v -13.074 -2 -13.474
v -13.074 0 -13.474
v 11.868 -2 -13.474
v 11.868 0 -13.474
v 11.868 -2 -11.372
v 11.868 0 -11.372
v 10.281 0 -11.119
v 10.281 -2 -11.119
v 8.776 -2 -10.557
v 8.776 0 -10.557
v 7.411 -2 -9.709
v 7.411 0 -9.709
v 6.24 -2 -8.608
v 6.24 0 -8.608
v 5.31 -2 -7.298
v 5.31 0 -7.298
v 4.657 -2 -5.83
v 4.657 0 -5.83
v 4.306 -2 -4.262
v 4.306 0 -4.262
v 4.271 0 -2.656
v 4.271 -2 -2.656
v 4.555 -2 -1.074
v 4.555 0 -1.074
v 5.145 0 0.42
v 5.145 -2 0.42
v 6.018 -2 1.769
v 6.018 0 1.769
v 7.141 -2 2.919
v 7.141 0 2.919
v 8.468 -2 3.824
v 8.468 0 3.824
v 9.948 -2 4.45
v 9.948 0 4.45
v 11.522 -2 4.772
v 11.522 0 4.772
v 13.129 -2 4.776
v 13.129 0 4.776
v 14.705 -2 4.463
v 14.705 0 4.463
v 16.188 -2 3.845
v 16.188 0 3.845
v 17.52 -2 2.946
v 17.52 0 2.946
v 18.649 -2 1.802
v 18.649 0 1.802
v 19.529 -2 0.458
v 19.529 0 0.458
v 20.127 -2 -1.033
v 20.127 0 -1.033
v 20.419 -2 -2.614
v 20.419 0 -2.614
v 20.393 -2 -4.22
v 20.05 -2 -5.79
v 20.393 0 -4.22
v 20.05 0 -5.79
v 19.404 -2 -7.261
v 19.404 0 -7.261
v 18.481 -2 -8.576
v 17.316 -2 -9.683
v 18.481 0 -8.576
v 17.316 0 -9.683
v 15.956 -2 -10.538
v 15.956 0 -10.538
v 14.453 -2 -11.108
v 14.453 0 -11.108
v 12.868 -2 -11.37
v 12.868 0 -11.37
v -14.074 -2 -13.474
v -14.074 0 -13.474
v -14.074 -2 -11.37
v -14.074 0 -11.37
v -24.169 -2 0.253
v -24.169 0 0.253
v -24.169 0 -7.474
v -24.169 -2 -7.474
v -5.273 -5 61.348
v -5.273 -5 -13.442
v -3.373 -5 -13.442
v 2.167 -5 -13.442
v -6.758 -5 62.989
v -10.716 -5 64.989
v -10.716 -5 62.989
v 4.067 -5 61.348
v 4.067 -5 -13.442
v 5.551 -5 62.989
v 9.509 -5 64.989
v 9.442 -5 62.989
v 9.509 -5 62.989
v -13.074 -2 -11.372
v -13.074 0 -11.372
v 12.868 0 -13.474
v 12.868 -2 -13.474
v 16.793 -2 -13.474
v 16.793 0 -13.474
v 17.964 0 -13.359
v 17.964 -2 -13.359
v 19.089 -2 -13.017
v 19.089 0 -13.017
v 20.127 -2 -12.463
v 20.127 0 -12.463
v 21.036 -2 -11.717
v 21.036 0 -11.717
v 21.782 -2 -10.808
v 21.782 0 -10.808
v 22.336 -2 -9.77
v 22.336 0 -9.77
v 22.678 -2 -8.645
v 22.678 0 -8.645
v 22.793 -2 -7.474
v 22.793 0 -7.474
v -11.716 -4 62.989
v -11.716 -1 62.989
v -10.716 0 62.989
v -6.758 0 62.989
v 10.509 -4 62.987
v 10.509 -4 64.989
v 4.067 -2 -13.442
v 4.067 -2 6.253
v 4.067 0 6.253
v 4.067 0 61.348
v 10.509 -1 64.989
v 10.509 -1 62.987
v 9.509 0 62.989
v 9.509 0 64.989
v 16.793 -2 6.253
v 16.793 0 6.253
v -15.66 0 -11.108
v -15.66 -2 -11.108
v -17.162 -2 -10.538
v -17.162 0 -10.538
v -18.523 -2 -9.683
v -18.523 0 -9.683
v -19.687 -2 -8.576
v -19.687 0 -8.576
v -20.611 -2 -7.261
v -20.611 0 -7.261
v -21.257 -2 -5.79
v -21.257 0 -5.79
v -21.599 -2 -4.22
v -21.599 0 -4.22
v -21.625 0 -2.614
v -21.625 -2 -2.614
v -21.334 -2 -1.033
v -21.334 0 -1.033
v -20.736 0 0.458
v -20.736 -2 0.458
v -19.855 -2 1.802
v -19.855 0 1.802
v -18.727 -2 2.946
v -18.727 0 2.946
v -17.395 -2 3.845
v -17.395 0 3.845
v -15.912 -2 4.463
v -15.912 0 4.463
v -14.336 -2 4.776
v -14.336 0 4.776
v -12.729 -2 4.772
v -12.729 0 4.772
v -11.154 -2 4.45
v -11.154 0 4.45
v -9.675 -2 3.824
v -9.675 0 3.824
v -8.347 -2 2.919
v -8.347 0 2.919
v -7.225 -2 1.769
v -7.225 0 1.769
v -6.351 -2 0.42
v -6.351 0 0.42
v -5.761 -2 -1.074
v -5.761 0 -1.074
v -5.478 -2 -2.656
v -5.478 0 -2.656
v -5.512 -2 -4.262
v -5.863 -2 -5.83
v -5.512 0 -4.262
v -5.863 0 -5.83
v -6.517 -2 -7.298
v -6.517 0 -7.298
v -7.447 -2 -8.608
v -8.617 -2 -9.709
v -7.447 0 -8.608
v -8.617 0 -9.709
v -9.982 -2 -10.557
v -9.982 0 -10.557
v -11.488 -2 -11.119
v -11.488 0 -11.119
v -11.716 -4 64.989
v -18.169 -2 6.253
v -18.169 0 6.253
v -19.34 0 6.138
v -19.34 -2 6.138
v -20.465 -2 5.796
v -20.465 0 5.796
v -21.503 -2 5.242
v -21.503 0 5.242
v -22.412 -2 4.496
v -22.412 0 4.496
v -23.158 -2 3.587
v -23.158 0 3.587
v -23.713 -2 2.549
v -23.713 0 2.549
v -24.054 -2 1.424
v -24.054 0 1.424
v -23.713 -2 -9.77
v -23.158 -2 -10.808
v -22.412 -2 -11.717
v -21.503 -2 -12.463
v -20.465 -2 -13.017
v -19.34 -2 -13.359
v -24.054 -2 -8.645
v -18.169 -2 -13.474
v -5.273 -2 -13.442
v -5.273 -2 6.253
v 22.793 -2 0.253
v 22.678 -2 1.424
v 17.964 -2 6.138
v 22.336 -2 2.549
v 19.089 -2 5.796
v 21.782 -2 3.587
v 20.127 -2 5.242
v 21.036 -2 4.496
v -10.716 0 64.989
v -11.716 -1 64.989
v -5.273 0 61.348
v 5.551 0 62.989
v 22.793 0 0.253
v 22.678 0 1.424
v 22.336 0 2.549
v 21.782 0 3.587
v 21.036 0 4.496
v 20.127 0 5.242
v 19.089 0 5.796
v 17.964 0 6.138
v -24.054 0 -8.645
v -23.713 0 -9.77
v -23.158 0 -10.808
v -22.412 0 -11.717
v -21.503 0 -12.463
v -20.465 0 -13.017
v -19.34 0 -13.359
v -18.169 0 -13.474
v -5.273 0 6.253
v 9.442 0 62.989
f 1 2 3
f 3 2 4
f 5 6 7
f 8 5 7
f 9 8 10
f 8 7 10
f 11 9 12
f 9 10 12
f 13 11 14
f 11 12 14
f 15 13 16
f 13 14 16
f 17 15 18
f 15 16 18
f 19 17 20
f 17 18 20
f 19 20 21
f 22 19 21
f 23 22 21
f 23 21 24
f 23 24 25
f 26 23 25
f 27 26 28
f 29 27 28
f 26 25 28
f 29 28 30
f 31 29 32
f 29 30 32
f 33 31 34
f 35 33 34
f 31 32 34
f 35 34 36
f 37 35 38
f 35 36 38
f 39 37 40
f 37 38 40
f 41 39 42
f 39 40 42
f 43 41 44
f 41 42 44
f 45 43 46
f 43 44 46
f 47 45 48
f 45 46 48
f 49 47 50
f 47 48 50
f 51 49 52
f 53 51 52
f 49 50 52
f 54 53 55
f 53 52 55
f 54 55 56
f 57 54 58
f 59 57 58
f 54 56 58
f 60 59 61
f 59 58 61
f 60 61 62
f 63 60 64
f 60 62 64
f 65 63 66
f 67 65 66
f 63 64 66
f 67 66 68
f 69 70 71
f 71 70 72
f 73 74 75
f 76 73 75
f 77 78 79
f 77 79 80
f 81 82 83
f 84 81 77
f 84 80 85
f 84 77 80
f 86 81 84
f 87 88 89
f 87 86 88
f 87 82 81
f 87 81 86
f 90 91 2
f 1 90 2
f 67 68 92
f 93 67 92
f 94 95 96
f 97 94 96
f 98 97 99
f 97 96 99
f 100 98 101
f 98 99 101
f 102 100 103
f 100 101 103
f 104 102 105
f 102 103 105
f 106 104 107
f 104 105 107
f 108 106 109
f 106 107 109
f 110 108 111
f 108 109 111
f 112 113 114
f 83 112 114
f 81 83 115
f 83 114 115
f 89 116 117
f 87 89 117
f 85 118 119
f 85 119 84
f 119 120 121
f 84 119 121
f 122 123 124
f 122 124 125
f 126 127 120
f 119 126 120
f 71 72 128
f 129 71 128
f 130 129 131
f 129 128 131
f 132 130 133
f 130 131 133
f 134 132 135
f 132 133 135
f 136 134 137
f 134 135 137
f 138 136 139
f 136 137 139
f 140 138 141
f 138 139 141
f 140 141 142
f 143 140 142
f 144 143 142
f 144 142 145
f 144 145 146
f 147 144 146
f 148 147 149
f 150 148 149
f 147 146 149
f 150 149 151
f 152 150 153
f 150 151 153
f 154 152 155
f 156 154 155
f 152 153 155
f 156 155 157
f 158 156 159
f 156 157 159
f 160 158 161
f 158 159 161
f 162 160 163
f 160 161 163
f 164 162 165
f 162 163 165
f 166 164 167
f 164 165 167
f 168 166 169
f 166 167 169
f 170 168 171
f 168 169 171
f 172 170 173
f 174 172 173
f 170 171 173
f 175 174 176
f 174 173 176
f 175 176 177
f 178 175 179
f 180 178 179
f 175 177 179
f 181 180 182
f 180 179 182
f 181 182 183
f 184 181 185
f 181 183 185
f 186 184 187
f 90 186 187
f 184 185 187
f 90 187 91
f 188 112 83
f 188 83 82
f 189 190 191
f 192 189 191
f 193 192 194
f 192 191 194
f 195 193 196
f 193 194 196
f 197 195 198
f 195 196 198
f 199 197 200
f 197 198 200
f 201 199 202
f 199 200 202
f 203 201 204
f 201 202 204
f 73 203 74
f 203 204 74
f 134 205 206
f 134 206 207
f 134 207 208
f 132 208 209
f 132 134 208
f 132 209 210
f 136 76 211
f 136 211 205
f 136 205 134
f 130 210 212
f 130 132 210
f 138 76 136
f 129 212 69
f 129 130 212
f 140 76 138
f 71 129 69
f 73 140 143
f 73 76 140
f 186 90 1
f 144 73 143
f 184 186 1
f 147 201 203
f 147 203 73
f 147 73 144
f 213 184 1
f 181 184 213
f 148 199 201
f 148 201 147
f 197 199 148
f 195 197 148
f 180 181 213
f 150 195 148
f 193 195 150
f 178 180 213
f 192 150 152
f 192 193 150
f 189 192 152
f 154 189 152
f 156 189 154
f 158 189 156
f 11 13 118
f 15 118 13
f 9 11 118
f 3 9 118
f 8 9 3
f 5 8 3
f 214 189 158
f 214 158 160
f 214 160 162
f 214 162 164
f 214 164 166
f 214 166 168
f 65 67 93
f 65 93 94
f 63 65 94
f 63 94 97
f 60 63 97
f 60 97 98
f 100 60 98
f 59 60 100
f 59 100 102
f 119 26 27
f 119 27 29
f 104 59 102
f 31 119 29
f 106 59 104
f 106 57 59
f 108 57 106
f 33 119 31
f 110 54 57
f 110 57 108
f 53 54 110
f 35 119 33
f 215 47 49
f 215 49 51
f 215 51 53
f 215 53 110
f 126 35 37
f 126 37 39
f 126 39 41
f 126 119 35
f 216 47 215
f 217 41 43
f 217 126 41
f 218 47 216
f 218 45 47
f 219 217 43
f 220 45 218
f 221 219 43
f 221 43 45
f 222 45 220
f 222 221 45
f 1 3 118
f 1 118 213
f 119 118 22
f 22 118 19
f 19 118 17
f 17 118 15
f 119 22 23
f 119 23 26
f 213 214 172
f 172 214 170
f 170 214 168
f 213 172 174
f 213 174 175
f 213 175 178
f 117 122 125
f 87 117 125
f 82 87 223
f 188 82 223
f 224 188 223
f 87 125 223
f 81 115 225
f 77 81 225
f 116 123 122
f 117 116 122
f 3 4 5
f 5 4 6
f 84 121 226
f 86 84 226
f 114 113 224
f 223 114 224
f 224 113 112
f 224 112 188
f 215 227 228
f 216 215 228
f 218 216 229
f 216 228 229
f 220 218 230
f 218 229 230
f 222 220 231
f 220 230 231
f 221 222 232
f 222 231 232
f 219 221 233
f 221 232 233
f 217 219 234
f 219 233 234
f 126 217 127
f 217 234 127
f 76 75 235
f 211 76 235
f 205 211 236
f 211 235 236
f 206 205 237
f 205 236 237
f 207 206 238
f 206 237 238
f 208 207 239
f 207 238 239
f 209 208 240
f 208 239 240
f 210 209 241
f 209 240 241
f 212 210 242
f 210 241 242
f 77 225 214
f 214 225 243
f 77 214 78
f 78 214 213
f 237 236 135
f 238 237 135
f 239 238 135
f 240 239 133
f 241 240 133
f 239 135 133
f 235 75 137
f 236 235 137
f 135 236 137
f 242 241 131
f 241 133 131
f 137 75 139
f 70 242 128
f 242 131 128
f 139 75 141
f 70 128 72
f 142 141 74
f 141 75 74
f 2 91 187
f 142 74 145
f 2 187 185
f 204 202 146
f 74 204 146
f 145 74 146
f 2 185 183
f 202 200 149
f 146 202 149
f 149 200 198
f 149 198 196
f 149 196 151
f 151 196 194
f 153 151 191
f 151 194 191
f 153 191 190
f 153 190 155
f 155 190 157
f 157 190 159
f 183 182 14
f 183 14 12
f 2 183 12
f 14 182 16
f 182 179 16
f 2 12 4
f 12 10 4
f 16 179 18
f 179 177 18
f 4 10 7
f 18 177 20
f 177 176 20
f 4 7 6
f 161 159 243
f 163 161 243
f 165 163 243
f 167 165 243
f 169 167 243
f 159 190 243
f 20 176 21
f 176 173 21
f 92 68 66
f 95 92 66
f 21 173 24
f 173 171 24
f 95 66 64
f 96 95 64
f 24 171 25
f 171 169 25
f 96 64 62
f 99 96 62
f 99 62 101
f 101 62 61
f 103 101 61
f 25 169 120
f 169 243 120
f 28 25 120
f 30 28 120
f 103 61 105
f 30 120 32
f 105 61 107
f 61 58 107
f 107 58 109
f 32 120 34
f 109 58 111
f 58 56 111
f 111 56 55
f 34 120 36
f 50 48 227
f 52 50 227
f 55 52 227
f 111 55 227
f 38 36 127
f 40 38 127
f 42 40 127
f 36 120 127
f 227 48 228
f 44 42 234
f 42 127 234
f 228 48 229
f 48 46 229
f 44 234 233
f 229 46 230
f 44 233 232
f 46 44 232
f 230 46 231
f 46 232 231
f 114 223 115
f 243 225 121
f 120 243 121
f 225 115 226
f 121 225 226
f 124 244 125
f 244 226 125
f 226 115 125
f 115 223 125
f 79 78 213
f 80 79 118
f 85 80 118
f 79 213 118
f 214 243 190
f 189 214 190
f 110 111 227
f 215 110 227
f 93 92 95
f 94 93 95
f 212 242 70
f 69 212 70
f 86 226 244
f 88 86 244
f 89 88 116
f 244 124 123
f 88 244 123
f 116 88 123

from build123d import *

# Parameters (mm, degrees)
F1_DEPTH = 2
F0_W     = 1.9
F0_H     = 55.0951848962
F0_W_2   = 3
F0_H_2   = 8.0191061349
F0_W_3   = 1.0669481622
F0_H_3   = 2
F0_H_4   = 17.6764619537
F0_H_5   = 2.0183531501
F2_DEPTH = 5
F3_SIZE  = 1


with BuildPart() as f1:
    # F0 (on Front) → F1 (new body)
    with BuildSketch(Plane.XZ):
        with BuildLine():
            Line((-5.2732866119, -11.4232450724), (-5.2732866119, 6.2532168813))
            Line((-5.2732866119, 6.2532168813), (-18.1692923009, 6.2532168813))
            ThreePointArc((-18.1692923009, 6.2532168813), (-22.4119329881, 4.4958575684), (-24.1692923009, 0.2532168813))
            Line((-24.1692923009, 0.2532168813), (-24.1692923009, -7.474217616))
            ThreePointArc((-24.1692923009, -7.474217616), (-22.4119329881, -11.7168583031), (-18.1692923009, -13.474217616))
            Line((-18.1692923009, -13.474217616), (-14.0744003764, -13.474217616))
            Line((-14.0744003764, -13.474217616), (-14.0744003764, -11.3696444416))
            ThreePointArc((-14.0744003764, -11.3696444416), (-13.5321325059, 4.8135476182), (-13.0744003764, -11.3722560686))
            Line((-13.0744003764, -11.3722560686), (-13.0744003764, -13.474217616))
            Line((-13.0744003764, -13.474217616), (11.8678271526, -13.474217616))
            Line((11.8678271526, -13.474217616), (11.8678271526, -11.3722560686))
            ThreePointArc((11.8678271526, -11.3722560686), (12.3255592821, 4.8135476182), (12.8678271526, -11.3696444416))
            Line((12.8678271526, -11.3696444416), (12.8678271526, -13.474217616))
            Line((12.8678271526, -13.474217616), (16.7931831032, -13.474217616))
            ThreePointArc((16.7931831032, -13.474217616), (21.0358237903, -11.7168583031), (22.7931831032, -7.474217616))
            Line((22.7931831032, -7.474217616), (22.7931831032, 0.2532168813))
            ThreePointArc((22.7931831032, 0.2532168813), (21.0358237903, 4.4958575684), (16.7931831032, 6.2532168813))
            Line((16.7931831032, 6.2532168813), (4.0667133881, 6.2532168813))
            Line((4.0667133881, 6.2532168813), (4.0667133881, -11.4232450724))
            Line((4.0667133881, -11.4232450724), (4.0667133881, -13.4415982225))
            Line((4.0667133881, -13.4415982225), (2.1667133881, -13.4415982225))
            Line((2.1667133881, -13.4415982225), (-3.3732866119, -13.4415982225))
            Line((-3.3732866119, -13.4415982225), (-5.2732866119, -13.4415982225))
            Line((-5.2732866119, -13.4415982225), (-5.2732866119, -11.4232450724))
        make_face()
    extrude(amount=F1_DEPTH)

    # F0 (on Front) → F2 (join)
    with BuildSketch(Plane.XZ):
        with Locations((-4.3232866119, 33.8008093294)):
            Rectangle(F0_W, F0_H)
        Polygon((-2.1032866119, 61.3484017775), (-3.3732866119, 61.3484017775), (-3.3732866119, 6.2532168813), (2.1667133881, 6.2532168813), (2.1667133881, 61.3484017775), (0.8967133881, 61.3484017775), (0.8967133881, 53.3292956426), (-2.1032866119, 53.3292956426), align=None)
        with Locations((3.1167133881, 33.8008093294)):
            Rectangle(F0_W, F0_H)
        with Locations((-0.6032866119, 57.3388487101)):
            Rectangle(F0_W_2, F0_H_2)
        Polygon((-6.7575482038, 62.9888176918), (-5.2732866119, 61.3484017775), (-3.3732866119, 61.3484017775), (-2.1032866119, 61.3484017775), (0.8967133881, 61.3484017775), (2.1667133881, 61.3484017775), (4.0667133881, 61.3484017775), (5.55097498, 62.9888176918), align=None)
        with Locations((-11.1823320082, 63.9888176918)):
            Rectangle(F0_W_3, F0_H_3)
        Polygon((9.4422847033, 64.9888176918), (9.4422847033, 62.9888176918), (10.5092328655, 62.9867687821), (10.5092328655, 64.9888176918), align=None)
        Polygon((-10.6488579271, 62.9888176918), (-6.7575482038, 62.9888176918), (5.55097498, 62.9888176918), (9.4422847033, 62.9888176918), (9.4422847033, 64.9888176918), (-10.6488579271, 64.9888176918), align=None)
        with Locations((-4.3232866119, -2.5850140955)):
            Rectangle(F0_W, F0_H_4)
        Polygon((2.1667133881, 6.2532168813), (-3.3732866119, 6.2532168813), (-3.3732866119, -11.4232450724), (-3.3732866119, -13.4415982225), (2.1667133881, -13.4415982225), (2.1667133881, -11.4232450724), align=None)
        with Locations((3.1167133881, -2.5850140955)):
            Rectangle(F0_W, F0_H_4)
        with Locations((-4.3232866119, -12.4324216474)):
            Rectangle(F0_W, F0_H_5)
        with Locations((3.1167133881, -12.4324216474)):
            Rectangle(F0_W, F0_H_5)
    extrude(amount=F2_DEPTH)

    # F3
    f3_edges = [f1.edges().sort_by_distance(p)[0] for p in [
        (10.509233, 0, 63.987793),
        (10.509233, -5, 63.987793),
        (-11.715806, -5, 63.988818),
        (-11.715806, 0, 63.988818),
    ]]
    chamfer(f3_edges, length=F3_SIZE)


solid = f1.part
